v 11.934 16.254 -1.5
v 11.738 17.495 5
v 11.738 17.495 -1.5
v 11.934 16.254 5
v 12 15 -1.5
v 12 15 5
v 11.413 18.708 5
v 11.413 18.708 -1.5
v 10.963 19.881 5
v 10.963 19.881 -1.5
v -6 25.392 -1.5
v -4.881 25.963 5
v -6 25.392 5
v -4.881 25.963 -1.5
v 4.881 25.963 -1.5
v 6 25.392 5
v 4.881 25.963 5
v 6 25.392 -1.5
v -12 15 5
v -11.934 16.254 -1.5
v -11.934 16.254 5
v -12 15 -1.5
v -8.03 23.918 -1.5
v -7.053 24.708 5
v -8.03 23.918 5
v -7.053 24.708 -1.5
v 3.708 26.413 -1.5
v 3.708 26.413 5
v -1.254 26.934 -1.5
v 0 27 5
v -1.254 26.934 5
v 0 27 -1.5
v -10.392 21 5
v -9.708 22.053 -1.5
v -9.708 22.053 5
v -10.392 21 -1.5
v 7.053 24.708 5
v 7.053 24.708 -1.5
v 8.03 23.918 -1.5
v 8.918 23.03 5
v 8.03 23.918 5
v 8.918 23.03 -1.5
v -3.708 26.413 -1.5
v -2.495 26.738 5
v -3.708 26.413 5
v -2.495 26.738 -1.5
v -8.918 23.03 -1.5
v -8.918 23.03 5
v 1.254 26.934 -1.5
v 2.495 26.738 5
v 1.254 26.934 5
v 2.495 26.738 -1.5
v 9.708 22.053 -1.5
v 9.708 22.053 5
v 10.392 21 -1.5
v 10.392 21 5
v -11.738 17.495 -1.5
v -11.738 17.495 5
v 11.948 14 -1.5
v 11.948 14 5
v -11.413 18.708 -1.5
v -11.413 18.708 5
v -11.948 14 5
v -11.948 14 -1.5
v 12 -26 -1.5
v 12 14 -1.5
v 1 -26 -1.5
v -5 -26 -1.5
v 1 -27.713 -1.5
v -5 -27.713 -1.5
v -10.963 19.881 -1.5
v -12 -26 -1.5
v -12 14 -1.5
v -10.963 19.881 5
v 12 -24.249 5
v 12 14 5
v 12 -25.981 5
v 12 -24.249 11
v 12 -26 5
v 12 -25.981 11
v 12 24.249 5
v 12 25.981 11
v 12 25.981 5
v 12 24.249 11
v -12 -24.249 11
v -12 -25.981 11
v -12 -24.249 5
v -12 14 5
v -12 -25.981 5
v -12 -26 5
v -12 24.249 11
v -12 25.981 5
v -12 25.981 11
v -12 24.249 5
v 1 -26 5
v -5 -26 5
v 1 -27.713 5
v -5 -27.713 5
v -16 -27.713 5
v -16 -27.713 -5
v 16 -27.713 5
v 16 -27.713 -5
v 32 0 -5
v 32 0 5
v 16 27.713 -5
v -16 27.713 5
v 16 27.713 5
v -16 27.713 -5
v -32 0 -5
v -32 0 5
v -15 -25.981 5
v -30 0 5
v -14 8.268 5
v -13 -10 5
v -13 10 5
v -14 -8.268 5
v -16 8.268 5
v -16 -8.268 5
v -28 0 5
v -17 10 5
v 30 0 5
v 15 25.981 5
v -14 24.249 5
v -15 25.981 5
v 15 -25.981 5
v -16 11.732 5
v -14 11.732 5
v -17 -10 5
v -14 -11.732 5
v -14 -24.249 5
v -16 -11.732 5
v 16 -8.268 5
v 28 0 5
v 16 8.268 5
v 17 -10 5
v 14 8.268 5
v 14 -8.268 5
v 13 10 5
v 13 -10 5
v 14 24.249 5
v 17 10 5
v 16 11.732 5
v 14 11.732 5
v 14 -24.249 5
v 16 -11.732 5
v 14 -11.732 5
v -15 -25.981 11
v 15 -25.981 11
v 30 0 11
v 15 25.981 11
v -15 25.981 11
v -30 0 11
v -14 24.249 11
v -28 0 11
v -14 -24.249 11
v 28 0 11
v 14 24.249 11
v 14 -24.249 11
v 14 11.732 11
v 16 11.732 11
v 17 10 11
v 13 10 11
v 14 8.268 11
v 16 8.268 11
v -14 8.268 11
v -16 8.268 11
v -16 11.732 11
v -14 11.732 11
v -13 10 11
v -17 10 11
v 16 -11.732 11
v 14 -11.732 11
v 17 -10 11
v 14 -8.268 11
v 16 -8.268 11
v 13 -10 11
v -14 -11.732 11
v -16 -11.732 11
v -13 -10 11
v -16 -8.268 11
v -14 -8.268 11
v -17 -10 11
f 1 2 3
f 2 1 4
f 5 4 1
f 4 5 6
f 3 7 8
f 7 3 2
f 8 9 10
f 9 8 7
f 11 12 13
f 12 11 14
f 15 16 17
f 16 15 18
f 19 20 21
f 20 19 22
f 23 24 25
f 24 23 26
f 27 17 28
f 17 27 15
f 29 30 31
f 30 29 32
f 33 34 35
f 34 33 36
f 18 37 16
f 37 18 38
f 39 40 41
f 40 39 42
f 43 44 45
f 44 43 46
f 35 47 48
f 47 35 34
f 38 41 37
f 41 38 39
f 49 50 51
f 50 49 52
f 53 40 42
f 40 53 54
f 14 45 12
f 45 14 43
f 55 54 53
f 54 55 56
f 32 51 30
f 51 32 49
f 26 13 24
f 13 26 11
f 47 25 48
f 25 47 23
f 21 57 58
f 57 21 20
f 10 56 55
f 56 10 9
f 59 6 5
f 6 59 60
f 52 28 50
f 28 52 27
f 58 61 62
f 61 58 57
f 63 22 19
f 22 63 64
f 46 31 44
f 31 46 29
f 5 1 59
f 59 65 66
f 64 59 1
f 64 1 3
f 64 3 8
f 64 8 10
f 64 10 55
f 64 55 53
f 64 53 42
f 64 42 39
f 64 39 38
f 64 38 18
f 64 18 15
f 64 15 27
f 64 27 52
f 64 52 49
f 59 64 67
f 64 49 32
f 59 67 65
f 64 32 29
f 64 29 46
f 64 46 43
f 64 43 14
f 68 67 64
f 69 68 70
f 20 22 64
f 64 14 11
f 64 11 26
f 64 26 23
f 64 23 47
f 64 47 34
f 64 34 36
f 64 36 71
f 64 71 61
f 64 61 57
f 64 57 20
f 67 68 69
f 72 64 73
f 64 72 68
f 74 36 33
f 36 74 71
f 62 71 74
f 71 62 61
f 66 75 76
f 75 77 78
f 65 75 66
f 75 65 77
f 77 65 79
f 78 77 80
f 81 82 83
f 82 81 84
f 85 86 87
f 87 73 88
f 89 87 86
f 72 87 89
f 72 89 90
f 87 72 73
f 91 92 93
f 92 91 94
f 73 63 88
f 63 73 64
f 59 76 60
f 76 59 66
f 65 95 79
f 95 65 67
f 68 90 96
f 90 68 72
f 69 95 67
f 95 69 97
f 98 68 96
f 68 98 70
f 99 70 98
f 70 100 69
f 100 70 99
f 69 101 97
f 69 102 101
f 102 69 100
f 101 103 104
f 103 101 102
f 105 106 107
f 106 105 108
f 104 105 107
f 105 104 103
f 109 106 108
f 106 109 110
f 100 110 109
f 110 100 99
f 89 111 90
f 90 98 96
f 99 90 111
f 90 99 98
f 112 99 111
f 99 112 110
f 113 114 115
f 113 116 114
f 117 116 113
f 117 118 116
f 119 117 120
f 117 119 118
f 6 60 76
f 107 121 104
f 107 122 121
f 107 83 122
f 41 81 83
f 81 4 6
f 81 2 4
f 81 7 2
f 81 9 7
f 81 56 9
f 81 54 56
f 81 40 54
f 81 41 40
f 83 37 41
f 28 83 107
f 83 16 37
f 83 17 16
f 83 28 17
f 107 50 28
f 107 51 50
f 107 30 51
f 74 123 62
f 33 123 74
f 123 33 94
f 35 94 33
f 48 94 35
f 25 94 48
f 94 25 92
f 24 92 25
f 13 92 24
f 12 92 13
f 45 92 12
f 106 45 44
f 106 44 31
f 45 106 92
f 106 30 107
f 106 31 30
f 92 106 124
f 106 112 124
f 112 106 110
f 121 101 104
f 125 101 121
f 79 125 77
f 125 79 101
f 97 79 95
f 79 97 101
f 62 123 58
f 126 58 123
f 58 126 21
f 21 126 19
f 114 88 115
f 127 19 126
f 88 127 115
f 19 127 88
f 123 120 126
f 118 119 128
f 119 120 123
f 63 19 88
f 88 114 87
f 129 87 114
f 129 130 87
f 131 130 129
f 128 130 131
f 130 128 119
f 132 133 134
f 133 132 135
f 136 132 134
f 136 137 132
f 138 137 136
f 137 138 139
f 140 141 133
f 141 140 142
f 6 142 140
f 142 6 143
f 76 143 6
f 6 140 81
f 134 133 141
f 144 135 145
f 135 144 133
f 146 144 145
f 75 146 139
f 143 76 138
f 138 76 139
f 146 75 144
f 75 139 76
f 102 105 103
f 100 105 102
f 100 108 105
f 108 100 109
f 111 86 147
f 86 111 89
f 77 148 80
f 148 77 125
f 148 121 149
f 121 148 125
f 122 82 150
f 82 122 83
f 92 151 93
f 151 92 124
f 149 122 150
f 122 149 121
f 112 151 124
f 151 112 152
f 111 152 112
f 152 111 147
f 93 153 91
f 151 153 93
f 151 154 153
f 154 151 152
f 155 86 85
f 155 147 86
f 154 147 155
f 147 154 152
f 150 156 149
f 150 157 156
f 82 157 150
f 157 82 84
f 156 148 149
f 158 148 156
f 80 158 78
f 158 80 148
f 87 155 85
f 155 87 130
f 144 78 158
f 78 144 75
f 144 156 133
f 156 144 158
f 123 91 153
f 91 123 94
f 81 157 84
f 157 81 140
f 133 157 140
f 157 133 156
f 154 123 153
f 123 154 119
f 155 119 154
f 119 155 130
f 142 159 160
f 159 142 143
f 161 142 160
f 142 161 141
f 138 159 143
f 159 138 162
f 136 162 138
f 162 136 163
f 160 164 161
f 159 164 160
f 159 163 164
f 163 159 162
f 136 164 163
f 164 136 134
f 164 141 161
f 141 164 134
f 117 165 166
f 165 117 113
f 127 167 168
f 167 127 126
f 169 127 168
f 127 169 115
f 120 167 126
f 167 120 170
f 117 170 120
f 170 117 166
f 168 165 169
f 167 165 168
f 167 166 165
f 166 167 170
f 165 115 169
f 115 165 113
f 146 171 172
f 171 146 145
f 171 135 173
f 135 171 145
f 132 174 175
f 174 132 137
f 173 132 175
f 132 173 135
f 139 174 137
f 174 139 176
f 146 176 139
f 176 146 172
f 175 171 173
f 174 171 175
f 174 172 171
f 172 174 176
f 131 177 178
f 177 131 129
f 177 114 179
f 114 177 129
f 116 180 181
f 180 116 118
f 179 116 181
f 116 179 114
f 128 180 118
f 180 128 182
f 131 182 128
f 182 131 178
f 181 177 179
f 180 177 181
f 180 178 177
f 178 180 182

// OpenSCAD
difference(){
    translate([0,0,0]){
        cylinder(r=32, h=10, $fn=6, center=true);
    }
    union(){
        translate([0,0,2]){
            color([0.2,0.2,0.2]){
                translate([0,15,0]){
                    cylinder(r=12, h=7, $fn=60, center=true);
                }
                translate([0,-6,0]){
                    cube([24,40,7],center=true);
                }
            }
        };
    translate([-2,-26,2]){
        color([0.2,0.2,0.2]){
            cube([6,4,7],center=true);
            }
        }
    }
}

difference(){
    difference(){
        translate([0,0,8]){
            cylinder(r=30, h=6, $fn=6, center=true);
        }
        translate([0,0,8]){
            cylinder(r=28, h=8, $fn=6, center=true);
            }
        }
        translate([0,0,8]){
            cube([24,80,7],center=true);
    }
}

translate([15,10,8]){
    cylinder(r=2, h=6, $fn=6, center=true);
}
translate([-15,10,8]){
    cylinder(r=2, h=6, $fn=6, center=true);
}
translate([15,-10,8]){
    cylinder(r=2, h=6, $fn=6, center=true);
}
translate([-15,-10,8]){
    cylinder(r=2, h=6, $fn=6, center=true);
}
